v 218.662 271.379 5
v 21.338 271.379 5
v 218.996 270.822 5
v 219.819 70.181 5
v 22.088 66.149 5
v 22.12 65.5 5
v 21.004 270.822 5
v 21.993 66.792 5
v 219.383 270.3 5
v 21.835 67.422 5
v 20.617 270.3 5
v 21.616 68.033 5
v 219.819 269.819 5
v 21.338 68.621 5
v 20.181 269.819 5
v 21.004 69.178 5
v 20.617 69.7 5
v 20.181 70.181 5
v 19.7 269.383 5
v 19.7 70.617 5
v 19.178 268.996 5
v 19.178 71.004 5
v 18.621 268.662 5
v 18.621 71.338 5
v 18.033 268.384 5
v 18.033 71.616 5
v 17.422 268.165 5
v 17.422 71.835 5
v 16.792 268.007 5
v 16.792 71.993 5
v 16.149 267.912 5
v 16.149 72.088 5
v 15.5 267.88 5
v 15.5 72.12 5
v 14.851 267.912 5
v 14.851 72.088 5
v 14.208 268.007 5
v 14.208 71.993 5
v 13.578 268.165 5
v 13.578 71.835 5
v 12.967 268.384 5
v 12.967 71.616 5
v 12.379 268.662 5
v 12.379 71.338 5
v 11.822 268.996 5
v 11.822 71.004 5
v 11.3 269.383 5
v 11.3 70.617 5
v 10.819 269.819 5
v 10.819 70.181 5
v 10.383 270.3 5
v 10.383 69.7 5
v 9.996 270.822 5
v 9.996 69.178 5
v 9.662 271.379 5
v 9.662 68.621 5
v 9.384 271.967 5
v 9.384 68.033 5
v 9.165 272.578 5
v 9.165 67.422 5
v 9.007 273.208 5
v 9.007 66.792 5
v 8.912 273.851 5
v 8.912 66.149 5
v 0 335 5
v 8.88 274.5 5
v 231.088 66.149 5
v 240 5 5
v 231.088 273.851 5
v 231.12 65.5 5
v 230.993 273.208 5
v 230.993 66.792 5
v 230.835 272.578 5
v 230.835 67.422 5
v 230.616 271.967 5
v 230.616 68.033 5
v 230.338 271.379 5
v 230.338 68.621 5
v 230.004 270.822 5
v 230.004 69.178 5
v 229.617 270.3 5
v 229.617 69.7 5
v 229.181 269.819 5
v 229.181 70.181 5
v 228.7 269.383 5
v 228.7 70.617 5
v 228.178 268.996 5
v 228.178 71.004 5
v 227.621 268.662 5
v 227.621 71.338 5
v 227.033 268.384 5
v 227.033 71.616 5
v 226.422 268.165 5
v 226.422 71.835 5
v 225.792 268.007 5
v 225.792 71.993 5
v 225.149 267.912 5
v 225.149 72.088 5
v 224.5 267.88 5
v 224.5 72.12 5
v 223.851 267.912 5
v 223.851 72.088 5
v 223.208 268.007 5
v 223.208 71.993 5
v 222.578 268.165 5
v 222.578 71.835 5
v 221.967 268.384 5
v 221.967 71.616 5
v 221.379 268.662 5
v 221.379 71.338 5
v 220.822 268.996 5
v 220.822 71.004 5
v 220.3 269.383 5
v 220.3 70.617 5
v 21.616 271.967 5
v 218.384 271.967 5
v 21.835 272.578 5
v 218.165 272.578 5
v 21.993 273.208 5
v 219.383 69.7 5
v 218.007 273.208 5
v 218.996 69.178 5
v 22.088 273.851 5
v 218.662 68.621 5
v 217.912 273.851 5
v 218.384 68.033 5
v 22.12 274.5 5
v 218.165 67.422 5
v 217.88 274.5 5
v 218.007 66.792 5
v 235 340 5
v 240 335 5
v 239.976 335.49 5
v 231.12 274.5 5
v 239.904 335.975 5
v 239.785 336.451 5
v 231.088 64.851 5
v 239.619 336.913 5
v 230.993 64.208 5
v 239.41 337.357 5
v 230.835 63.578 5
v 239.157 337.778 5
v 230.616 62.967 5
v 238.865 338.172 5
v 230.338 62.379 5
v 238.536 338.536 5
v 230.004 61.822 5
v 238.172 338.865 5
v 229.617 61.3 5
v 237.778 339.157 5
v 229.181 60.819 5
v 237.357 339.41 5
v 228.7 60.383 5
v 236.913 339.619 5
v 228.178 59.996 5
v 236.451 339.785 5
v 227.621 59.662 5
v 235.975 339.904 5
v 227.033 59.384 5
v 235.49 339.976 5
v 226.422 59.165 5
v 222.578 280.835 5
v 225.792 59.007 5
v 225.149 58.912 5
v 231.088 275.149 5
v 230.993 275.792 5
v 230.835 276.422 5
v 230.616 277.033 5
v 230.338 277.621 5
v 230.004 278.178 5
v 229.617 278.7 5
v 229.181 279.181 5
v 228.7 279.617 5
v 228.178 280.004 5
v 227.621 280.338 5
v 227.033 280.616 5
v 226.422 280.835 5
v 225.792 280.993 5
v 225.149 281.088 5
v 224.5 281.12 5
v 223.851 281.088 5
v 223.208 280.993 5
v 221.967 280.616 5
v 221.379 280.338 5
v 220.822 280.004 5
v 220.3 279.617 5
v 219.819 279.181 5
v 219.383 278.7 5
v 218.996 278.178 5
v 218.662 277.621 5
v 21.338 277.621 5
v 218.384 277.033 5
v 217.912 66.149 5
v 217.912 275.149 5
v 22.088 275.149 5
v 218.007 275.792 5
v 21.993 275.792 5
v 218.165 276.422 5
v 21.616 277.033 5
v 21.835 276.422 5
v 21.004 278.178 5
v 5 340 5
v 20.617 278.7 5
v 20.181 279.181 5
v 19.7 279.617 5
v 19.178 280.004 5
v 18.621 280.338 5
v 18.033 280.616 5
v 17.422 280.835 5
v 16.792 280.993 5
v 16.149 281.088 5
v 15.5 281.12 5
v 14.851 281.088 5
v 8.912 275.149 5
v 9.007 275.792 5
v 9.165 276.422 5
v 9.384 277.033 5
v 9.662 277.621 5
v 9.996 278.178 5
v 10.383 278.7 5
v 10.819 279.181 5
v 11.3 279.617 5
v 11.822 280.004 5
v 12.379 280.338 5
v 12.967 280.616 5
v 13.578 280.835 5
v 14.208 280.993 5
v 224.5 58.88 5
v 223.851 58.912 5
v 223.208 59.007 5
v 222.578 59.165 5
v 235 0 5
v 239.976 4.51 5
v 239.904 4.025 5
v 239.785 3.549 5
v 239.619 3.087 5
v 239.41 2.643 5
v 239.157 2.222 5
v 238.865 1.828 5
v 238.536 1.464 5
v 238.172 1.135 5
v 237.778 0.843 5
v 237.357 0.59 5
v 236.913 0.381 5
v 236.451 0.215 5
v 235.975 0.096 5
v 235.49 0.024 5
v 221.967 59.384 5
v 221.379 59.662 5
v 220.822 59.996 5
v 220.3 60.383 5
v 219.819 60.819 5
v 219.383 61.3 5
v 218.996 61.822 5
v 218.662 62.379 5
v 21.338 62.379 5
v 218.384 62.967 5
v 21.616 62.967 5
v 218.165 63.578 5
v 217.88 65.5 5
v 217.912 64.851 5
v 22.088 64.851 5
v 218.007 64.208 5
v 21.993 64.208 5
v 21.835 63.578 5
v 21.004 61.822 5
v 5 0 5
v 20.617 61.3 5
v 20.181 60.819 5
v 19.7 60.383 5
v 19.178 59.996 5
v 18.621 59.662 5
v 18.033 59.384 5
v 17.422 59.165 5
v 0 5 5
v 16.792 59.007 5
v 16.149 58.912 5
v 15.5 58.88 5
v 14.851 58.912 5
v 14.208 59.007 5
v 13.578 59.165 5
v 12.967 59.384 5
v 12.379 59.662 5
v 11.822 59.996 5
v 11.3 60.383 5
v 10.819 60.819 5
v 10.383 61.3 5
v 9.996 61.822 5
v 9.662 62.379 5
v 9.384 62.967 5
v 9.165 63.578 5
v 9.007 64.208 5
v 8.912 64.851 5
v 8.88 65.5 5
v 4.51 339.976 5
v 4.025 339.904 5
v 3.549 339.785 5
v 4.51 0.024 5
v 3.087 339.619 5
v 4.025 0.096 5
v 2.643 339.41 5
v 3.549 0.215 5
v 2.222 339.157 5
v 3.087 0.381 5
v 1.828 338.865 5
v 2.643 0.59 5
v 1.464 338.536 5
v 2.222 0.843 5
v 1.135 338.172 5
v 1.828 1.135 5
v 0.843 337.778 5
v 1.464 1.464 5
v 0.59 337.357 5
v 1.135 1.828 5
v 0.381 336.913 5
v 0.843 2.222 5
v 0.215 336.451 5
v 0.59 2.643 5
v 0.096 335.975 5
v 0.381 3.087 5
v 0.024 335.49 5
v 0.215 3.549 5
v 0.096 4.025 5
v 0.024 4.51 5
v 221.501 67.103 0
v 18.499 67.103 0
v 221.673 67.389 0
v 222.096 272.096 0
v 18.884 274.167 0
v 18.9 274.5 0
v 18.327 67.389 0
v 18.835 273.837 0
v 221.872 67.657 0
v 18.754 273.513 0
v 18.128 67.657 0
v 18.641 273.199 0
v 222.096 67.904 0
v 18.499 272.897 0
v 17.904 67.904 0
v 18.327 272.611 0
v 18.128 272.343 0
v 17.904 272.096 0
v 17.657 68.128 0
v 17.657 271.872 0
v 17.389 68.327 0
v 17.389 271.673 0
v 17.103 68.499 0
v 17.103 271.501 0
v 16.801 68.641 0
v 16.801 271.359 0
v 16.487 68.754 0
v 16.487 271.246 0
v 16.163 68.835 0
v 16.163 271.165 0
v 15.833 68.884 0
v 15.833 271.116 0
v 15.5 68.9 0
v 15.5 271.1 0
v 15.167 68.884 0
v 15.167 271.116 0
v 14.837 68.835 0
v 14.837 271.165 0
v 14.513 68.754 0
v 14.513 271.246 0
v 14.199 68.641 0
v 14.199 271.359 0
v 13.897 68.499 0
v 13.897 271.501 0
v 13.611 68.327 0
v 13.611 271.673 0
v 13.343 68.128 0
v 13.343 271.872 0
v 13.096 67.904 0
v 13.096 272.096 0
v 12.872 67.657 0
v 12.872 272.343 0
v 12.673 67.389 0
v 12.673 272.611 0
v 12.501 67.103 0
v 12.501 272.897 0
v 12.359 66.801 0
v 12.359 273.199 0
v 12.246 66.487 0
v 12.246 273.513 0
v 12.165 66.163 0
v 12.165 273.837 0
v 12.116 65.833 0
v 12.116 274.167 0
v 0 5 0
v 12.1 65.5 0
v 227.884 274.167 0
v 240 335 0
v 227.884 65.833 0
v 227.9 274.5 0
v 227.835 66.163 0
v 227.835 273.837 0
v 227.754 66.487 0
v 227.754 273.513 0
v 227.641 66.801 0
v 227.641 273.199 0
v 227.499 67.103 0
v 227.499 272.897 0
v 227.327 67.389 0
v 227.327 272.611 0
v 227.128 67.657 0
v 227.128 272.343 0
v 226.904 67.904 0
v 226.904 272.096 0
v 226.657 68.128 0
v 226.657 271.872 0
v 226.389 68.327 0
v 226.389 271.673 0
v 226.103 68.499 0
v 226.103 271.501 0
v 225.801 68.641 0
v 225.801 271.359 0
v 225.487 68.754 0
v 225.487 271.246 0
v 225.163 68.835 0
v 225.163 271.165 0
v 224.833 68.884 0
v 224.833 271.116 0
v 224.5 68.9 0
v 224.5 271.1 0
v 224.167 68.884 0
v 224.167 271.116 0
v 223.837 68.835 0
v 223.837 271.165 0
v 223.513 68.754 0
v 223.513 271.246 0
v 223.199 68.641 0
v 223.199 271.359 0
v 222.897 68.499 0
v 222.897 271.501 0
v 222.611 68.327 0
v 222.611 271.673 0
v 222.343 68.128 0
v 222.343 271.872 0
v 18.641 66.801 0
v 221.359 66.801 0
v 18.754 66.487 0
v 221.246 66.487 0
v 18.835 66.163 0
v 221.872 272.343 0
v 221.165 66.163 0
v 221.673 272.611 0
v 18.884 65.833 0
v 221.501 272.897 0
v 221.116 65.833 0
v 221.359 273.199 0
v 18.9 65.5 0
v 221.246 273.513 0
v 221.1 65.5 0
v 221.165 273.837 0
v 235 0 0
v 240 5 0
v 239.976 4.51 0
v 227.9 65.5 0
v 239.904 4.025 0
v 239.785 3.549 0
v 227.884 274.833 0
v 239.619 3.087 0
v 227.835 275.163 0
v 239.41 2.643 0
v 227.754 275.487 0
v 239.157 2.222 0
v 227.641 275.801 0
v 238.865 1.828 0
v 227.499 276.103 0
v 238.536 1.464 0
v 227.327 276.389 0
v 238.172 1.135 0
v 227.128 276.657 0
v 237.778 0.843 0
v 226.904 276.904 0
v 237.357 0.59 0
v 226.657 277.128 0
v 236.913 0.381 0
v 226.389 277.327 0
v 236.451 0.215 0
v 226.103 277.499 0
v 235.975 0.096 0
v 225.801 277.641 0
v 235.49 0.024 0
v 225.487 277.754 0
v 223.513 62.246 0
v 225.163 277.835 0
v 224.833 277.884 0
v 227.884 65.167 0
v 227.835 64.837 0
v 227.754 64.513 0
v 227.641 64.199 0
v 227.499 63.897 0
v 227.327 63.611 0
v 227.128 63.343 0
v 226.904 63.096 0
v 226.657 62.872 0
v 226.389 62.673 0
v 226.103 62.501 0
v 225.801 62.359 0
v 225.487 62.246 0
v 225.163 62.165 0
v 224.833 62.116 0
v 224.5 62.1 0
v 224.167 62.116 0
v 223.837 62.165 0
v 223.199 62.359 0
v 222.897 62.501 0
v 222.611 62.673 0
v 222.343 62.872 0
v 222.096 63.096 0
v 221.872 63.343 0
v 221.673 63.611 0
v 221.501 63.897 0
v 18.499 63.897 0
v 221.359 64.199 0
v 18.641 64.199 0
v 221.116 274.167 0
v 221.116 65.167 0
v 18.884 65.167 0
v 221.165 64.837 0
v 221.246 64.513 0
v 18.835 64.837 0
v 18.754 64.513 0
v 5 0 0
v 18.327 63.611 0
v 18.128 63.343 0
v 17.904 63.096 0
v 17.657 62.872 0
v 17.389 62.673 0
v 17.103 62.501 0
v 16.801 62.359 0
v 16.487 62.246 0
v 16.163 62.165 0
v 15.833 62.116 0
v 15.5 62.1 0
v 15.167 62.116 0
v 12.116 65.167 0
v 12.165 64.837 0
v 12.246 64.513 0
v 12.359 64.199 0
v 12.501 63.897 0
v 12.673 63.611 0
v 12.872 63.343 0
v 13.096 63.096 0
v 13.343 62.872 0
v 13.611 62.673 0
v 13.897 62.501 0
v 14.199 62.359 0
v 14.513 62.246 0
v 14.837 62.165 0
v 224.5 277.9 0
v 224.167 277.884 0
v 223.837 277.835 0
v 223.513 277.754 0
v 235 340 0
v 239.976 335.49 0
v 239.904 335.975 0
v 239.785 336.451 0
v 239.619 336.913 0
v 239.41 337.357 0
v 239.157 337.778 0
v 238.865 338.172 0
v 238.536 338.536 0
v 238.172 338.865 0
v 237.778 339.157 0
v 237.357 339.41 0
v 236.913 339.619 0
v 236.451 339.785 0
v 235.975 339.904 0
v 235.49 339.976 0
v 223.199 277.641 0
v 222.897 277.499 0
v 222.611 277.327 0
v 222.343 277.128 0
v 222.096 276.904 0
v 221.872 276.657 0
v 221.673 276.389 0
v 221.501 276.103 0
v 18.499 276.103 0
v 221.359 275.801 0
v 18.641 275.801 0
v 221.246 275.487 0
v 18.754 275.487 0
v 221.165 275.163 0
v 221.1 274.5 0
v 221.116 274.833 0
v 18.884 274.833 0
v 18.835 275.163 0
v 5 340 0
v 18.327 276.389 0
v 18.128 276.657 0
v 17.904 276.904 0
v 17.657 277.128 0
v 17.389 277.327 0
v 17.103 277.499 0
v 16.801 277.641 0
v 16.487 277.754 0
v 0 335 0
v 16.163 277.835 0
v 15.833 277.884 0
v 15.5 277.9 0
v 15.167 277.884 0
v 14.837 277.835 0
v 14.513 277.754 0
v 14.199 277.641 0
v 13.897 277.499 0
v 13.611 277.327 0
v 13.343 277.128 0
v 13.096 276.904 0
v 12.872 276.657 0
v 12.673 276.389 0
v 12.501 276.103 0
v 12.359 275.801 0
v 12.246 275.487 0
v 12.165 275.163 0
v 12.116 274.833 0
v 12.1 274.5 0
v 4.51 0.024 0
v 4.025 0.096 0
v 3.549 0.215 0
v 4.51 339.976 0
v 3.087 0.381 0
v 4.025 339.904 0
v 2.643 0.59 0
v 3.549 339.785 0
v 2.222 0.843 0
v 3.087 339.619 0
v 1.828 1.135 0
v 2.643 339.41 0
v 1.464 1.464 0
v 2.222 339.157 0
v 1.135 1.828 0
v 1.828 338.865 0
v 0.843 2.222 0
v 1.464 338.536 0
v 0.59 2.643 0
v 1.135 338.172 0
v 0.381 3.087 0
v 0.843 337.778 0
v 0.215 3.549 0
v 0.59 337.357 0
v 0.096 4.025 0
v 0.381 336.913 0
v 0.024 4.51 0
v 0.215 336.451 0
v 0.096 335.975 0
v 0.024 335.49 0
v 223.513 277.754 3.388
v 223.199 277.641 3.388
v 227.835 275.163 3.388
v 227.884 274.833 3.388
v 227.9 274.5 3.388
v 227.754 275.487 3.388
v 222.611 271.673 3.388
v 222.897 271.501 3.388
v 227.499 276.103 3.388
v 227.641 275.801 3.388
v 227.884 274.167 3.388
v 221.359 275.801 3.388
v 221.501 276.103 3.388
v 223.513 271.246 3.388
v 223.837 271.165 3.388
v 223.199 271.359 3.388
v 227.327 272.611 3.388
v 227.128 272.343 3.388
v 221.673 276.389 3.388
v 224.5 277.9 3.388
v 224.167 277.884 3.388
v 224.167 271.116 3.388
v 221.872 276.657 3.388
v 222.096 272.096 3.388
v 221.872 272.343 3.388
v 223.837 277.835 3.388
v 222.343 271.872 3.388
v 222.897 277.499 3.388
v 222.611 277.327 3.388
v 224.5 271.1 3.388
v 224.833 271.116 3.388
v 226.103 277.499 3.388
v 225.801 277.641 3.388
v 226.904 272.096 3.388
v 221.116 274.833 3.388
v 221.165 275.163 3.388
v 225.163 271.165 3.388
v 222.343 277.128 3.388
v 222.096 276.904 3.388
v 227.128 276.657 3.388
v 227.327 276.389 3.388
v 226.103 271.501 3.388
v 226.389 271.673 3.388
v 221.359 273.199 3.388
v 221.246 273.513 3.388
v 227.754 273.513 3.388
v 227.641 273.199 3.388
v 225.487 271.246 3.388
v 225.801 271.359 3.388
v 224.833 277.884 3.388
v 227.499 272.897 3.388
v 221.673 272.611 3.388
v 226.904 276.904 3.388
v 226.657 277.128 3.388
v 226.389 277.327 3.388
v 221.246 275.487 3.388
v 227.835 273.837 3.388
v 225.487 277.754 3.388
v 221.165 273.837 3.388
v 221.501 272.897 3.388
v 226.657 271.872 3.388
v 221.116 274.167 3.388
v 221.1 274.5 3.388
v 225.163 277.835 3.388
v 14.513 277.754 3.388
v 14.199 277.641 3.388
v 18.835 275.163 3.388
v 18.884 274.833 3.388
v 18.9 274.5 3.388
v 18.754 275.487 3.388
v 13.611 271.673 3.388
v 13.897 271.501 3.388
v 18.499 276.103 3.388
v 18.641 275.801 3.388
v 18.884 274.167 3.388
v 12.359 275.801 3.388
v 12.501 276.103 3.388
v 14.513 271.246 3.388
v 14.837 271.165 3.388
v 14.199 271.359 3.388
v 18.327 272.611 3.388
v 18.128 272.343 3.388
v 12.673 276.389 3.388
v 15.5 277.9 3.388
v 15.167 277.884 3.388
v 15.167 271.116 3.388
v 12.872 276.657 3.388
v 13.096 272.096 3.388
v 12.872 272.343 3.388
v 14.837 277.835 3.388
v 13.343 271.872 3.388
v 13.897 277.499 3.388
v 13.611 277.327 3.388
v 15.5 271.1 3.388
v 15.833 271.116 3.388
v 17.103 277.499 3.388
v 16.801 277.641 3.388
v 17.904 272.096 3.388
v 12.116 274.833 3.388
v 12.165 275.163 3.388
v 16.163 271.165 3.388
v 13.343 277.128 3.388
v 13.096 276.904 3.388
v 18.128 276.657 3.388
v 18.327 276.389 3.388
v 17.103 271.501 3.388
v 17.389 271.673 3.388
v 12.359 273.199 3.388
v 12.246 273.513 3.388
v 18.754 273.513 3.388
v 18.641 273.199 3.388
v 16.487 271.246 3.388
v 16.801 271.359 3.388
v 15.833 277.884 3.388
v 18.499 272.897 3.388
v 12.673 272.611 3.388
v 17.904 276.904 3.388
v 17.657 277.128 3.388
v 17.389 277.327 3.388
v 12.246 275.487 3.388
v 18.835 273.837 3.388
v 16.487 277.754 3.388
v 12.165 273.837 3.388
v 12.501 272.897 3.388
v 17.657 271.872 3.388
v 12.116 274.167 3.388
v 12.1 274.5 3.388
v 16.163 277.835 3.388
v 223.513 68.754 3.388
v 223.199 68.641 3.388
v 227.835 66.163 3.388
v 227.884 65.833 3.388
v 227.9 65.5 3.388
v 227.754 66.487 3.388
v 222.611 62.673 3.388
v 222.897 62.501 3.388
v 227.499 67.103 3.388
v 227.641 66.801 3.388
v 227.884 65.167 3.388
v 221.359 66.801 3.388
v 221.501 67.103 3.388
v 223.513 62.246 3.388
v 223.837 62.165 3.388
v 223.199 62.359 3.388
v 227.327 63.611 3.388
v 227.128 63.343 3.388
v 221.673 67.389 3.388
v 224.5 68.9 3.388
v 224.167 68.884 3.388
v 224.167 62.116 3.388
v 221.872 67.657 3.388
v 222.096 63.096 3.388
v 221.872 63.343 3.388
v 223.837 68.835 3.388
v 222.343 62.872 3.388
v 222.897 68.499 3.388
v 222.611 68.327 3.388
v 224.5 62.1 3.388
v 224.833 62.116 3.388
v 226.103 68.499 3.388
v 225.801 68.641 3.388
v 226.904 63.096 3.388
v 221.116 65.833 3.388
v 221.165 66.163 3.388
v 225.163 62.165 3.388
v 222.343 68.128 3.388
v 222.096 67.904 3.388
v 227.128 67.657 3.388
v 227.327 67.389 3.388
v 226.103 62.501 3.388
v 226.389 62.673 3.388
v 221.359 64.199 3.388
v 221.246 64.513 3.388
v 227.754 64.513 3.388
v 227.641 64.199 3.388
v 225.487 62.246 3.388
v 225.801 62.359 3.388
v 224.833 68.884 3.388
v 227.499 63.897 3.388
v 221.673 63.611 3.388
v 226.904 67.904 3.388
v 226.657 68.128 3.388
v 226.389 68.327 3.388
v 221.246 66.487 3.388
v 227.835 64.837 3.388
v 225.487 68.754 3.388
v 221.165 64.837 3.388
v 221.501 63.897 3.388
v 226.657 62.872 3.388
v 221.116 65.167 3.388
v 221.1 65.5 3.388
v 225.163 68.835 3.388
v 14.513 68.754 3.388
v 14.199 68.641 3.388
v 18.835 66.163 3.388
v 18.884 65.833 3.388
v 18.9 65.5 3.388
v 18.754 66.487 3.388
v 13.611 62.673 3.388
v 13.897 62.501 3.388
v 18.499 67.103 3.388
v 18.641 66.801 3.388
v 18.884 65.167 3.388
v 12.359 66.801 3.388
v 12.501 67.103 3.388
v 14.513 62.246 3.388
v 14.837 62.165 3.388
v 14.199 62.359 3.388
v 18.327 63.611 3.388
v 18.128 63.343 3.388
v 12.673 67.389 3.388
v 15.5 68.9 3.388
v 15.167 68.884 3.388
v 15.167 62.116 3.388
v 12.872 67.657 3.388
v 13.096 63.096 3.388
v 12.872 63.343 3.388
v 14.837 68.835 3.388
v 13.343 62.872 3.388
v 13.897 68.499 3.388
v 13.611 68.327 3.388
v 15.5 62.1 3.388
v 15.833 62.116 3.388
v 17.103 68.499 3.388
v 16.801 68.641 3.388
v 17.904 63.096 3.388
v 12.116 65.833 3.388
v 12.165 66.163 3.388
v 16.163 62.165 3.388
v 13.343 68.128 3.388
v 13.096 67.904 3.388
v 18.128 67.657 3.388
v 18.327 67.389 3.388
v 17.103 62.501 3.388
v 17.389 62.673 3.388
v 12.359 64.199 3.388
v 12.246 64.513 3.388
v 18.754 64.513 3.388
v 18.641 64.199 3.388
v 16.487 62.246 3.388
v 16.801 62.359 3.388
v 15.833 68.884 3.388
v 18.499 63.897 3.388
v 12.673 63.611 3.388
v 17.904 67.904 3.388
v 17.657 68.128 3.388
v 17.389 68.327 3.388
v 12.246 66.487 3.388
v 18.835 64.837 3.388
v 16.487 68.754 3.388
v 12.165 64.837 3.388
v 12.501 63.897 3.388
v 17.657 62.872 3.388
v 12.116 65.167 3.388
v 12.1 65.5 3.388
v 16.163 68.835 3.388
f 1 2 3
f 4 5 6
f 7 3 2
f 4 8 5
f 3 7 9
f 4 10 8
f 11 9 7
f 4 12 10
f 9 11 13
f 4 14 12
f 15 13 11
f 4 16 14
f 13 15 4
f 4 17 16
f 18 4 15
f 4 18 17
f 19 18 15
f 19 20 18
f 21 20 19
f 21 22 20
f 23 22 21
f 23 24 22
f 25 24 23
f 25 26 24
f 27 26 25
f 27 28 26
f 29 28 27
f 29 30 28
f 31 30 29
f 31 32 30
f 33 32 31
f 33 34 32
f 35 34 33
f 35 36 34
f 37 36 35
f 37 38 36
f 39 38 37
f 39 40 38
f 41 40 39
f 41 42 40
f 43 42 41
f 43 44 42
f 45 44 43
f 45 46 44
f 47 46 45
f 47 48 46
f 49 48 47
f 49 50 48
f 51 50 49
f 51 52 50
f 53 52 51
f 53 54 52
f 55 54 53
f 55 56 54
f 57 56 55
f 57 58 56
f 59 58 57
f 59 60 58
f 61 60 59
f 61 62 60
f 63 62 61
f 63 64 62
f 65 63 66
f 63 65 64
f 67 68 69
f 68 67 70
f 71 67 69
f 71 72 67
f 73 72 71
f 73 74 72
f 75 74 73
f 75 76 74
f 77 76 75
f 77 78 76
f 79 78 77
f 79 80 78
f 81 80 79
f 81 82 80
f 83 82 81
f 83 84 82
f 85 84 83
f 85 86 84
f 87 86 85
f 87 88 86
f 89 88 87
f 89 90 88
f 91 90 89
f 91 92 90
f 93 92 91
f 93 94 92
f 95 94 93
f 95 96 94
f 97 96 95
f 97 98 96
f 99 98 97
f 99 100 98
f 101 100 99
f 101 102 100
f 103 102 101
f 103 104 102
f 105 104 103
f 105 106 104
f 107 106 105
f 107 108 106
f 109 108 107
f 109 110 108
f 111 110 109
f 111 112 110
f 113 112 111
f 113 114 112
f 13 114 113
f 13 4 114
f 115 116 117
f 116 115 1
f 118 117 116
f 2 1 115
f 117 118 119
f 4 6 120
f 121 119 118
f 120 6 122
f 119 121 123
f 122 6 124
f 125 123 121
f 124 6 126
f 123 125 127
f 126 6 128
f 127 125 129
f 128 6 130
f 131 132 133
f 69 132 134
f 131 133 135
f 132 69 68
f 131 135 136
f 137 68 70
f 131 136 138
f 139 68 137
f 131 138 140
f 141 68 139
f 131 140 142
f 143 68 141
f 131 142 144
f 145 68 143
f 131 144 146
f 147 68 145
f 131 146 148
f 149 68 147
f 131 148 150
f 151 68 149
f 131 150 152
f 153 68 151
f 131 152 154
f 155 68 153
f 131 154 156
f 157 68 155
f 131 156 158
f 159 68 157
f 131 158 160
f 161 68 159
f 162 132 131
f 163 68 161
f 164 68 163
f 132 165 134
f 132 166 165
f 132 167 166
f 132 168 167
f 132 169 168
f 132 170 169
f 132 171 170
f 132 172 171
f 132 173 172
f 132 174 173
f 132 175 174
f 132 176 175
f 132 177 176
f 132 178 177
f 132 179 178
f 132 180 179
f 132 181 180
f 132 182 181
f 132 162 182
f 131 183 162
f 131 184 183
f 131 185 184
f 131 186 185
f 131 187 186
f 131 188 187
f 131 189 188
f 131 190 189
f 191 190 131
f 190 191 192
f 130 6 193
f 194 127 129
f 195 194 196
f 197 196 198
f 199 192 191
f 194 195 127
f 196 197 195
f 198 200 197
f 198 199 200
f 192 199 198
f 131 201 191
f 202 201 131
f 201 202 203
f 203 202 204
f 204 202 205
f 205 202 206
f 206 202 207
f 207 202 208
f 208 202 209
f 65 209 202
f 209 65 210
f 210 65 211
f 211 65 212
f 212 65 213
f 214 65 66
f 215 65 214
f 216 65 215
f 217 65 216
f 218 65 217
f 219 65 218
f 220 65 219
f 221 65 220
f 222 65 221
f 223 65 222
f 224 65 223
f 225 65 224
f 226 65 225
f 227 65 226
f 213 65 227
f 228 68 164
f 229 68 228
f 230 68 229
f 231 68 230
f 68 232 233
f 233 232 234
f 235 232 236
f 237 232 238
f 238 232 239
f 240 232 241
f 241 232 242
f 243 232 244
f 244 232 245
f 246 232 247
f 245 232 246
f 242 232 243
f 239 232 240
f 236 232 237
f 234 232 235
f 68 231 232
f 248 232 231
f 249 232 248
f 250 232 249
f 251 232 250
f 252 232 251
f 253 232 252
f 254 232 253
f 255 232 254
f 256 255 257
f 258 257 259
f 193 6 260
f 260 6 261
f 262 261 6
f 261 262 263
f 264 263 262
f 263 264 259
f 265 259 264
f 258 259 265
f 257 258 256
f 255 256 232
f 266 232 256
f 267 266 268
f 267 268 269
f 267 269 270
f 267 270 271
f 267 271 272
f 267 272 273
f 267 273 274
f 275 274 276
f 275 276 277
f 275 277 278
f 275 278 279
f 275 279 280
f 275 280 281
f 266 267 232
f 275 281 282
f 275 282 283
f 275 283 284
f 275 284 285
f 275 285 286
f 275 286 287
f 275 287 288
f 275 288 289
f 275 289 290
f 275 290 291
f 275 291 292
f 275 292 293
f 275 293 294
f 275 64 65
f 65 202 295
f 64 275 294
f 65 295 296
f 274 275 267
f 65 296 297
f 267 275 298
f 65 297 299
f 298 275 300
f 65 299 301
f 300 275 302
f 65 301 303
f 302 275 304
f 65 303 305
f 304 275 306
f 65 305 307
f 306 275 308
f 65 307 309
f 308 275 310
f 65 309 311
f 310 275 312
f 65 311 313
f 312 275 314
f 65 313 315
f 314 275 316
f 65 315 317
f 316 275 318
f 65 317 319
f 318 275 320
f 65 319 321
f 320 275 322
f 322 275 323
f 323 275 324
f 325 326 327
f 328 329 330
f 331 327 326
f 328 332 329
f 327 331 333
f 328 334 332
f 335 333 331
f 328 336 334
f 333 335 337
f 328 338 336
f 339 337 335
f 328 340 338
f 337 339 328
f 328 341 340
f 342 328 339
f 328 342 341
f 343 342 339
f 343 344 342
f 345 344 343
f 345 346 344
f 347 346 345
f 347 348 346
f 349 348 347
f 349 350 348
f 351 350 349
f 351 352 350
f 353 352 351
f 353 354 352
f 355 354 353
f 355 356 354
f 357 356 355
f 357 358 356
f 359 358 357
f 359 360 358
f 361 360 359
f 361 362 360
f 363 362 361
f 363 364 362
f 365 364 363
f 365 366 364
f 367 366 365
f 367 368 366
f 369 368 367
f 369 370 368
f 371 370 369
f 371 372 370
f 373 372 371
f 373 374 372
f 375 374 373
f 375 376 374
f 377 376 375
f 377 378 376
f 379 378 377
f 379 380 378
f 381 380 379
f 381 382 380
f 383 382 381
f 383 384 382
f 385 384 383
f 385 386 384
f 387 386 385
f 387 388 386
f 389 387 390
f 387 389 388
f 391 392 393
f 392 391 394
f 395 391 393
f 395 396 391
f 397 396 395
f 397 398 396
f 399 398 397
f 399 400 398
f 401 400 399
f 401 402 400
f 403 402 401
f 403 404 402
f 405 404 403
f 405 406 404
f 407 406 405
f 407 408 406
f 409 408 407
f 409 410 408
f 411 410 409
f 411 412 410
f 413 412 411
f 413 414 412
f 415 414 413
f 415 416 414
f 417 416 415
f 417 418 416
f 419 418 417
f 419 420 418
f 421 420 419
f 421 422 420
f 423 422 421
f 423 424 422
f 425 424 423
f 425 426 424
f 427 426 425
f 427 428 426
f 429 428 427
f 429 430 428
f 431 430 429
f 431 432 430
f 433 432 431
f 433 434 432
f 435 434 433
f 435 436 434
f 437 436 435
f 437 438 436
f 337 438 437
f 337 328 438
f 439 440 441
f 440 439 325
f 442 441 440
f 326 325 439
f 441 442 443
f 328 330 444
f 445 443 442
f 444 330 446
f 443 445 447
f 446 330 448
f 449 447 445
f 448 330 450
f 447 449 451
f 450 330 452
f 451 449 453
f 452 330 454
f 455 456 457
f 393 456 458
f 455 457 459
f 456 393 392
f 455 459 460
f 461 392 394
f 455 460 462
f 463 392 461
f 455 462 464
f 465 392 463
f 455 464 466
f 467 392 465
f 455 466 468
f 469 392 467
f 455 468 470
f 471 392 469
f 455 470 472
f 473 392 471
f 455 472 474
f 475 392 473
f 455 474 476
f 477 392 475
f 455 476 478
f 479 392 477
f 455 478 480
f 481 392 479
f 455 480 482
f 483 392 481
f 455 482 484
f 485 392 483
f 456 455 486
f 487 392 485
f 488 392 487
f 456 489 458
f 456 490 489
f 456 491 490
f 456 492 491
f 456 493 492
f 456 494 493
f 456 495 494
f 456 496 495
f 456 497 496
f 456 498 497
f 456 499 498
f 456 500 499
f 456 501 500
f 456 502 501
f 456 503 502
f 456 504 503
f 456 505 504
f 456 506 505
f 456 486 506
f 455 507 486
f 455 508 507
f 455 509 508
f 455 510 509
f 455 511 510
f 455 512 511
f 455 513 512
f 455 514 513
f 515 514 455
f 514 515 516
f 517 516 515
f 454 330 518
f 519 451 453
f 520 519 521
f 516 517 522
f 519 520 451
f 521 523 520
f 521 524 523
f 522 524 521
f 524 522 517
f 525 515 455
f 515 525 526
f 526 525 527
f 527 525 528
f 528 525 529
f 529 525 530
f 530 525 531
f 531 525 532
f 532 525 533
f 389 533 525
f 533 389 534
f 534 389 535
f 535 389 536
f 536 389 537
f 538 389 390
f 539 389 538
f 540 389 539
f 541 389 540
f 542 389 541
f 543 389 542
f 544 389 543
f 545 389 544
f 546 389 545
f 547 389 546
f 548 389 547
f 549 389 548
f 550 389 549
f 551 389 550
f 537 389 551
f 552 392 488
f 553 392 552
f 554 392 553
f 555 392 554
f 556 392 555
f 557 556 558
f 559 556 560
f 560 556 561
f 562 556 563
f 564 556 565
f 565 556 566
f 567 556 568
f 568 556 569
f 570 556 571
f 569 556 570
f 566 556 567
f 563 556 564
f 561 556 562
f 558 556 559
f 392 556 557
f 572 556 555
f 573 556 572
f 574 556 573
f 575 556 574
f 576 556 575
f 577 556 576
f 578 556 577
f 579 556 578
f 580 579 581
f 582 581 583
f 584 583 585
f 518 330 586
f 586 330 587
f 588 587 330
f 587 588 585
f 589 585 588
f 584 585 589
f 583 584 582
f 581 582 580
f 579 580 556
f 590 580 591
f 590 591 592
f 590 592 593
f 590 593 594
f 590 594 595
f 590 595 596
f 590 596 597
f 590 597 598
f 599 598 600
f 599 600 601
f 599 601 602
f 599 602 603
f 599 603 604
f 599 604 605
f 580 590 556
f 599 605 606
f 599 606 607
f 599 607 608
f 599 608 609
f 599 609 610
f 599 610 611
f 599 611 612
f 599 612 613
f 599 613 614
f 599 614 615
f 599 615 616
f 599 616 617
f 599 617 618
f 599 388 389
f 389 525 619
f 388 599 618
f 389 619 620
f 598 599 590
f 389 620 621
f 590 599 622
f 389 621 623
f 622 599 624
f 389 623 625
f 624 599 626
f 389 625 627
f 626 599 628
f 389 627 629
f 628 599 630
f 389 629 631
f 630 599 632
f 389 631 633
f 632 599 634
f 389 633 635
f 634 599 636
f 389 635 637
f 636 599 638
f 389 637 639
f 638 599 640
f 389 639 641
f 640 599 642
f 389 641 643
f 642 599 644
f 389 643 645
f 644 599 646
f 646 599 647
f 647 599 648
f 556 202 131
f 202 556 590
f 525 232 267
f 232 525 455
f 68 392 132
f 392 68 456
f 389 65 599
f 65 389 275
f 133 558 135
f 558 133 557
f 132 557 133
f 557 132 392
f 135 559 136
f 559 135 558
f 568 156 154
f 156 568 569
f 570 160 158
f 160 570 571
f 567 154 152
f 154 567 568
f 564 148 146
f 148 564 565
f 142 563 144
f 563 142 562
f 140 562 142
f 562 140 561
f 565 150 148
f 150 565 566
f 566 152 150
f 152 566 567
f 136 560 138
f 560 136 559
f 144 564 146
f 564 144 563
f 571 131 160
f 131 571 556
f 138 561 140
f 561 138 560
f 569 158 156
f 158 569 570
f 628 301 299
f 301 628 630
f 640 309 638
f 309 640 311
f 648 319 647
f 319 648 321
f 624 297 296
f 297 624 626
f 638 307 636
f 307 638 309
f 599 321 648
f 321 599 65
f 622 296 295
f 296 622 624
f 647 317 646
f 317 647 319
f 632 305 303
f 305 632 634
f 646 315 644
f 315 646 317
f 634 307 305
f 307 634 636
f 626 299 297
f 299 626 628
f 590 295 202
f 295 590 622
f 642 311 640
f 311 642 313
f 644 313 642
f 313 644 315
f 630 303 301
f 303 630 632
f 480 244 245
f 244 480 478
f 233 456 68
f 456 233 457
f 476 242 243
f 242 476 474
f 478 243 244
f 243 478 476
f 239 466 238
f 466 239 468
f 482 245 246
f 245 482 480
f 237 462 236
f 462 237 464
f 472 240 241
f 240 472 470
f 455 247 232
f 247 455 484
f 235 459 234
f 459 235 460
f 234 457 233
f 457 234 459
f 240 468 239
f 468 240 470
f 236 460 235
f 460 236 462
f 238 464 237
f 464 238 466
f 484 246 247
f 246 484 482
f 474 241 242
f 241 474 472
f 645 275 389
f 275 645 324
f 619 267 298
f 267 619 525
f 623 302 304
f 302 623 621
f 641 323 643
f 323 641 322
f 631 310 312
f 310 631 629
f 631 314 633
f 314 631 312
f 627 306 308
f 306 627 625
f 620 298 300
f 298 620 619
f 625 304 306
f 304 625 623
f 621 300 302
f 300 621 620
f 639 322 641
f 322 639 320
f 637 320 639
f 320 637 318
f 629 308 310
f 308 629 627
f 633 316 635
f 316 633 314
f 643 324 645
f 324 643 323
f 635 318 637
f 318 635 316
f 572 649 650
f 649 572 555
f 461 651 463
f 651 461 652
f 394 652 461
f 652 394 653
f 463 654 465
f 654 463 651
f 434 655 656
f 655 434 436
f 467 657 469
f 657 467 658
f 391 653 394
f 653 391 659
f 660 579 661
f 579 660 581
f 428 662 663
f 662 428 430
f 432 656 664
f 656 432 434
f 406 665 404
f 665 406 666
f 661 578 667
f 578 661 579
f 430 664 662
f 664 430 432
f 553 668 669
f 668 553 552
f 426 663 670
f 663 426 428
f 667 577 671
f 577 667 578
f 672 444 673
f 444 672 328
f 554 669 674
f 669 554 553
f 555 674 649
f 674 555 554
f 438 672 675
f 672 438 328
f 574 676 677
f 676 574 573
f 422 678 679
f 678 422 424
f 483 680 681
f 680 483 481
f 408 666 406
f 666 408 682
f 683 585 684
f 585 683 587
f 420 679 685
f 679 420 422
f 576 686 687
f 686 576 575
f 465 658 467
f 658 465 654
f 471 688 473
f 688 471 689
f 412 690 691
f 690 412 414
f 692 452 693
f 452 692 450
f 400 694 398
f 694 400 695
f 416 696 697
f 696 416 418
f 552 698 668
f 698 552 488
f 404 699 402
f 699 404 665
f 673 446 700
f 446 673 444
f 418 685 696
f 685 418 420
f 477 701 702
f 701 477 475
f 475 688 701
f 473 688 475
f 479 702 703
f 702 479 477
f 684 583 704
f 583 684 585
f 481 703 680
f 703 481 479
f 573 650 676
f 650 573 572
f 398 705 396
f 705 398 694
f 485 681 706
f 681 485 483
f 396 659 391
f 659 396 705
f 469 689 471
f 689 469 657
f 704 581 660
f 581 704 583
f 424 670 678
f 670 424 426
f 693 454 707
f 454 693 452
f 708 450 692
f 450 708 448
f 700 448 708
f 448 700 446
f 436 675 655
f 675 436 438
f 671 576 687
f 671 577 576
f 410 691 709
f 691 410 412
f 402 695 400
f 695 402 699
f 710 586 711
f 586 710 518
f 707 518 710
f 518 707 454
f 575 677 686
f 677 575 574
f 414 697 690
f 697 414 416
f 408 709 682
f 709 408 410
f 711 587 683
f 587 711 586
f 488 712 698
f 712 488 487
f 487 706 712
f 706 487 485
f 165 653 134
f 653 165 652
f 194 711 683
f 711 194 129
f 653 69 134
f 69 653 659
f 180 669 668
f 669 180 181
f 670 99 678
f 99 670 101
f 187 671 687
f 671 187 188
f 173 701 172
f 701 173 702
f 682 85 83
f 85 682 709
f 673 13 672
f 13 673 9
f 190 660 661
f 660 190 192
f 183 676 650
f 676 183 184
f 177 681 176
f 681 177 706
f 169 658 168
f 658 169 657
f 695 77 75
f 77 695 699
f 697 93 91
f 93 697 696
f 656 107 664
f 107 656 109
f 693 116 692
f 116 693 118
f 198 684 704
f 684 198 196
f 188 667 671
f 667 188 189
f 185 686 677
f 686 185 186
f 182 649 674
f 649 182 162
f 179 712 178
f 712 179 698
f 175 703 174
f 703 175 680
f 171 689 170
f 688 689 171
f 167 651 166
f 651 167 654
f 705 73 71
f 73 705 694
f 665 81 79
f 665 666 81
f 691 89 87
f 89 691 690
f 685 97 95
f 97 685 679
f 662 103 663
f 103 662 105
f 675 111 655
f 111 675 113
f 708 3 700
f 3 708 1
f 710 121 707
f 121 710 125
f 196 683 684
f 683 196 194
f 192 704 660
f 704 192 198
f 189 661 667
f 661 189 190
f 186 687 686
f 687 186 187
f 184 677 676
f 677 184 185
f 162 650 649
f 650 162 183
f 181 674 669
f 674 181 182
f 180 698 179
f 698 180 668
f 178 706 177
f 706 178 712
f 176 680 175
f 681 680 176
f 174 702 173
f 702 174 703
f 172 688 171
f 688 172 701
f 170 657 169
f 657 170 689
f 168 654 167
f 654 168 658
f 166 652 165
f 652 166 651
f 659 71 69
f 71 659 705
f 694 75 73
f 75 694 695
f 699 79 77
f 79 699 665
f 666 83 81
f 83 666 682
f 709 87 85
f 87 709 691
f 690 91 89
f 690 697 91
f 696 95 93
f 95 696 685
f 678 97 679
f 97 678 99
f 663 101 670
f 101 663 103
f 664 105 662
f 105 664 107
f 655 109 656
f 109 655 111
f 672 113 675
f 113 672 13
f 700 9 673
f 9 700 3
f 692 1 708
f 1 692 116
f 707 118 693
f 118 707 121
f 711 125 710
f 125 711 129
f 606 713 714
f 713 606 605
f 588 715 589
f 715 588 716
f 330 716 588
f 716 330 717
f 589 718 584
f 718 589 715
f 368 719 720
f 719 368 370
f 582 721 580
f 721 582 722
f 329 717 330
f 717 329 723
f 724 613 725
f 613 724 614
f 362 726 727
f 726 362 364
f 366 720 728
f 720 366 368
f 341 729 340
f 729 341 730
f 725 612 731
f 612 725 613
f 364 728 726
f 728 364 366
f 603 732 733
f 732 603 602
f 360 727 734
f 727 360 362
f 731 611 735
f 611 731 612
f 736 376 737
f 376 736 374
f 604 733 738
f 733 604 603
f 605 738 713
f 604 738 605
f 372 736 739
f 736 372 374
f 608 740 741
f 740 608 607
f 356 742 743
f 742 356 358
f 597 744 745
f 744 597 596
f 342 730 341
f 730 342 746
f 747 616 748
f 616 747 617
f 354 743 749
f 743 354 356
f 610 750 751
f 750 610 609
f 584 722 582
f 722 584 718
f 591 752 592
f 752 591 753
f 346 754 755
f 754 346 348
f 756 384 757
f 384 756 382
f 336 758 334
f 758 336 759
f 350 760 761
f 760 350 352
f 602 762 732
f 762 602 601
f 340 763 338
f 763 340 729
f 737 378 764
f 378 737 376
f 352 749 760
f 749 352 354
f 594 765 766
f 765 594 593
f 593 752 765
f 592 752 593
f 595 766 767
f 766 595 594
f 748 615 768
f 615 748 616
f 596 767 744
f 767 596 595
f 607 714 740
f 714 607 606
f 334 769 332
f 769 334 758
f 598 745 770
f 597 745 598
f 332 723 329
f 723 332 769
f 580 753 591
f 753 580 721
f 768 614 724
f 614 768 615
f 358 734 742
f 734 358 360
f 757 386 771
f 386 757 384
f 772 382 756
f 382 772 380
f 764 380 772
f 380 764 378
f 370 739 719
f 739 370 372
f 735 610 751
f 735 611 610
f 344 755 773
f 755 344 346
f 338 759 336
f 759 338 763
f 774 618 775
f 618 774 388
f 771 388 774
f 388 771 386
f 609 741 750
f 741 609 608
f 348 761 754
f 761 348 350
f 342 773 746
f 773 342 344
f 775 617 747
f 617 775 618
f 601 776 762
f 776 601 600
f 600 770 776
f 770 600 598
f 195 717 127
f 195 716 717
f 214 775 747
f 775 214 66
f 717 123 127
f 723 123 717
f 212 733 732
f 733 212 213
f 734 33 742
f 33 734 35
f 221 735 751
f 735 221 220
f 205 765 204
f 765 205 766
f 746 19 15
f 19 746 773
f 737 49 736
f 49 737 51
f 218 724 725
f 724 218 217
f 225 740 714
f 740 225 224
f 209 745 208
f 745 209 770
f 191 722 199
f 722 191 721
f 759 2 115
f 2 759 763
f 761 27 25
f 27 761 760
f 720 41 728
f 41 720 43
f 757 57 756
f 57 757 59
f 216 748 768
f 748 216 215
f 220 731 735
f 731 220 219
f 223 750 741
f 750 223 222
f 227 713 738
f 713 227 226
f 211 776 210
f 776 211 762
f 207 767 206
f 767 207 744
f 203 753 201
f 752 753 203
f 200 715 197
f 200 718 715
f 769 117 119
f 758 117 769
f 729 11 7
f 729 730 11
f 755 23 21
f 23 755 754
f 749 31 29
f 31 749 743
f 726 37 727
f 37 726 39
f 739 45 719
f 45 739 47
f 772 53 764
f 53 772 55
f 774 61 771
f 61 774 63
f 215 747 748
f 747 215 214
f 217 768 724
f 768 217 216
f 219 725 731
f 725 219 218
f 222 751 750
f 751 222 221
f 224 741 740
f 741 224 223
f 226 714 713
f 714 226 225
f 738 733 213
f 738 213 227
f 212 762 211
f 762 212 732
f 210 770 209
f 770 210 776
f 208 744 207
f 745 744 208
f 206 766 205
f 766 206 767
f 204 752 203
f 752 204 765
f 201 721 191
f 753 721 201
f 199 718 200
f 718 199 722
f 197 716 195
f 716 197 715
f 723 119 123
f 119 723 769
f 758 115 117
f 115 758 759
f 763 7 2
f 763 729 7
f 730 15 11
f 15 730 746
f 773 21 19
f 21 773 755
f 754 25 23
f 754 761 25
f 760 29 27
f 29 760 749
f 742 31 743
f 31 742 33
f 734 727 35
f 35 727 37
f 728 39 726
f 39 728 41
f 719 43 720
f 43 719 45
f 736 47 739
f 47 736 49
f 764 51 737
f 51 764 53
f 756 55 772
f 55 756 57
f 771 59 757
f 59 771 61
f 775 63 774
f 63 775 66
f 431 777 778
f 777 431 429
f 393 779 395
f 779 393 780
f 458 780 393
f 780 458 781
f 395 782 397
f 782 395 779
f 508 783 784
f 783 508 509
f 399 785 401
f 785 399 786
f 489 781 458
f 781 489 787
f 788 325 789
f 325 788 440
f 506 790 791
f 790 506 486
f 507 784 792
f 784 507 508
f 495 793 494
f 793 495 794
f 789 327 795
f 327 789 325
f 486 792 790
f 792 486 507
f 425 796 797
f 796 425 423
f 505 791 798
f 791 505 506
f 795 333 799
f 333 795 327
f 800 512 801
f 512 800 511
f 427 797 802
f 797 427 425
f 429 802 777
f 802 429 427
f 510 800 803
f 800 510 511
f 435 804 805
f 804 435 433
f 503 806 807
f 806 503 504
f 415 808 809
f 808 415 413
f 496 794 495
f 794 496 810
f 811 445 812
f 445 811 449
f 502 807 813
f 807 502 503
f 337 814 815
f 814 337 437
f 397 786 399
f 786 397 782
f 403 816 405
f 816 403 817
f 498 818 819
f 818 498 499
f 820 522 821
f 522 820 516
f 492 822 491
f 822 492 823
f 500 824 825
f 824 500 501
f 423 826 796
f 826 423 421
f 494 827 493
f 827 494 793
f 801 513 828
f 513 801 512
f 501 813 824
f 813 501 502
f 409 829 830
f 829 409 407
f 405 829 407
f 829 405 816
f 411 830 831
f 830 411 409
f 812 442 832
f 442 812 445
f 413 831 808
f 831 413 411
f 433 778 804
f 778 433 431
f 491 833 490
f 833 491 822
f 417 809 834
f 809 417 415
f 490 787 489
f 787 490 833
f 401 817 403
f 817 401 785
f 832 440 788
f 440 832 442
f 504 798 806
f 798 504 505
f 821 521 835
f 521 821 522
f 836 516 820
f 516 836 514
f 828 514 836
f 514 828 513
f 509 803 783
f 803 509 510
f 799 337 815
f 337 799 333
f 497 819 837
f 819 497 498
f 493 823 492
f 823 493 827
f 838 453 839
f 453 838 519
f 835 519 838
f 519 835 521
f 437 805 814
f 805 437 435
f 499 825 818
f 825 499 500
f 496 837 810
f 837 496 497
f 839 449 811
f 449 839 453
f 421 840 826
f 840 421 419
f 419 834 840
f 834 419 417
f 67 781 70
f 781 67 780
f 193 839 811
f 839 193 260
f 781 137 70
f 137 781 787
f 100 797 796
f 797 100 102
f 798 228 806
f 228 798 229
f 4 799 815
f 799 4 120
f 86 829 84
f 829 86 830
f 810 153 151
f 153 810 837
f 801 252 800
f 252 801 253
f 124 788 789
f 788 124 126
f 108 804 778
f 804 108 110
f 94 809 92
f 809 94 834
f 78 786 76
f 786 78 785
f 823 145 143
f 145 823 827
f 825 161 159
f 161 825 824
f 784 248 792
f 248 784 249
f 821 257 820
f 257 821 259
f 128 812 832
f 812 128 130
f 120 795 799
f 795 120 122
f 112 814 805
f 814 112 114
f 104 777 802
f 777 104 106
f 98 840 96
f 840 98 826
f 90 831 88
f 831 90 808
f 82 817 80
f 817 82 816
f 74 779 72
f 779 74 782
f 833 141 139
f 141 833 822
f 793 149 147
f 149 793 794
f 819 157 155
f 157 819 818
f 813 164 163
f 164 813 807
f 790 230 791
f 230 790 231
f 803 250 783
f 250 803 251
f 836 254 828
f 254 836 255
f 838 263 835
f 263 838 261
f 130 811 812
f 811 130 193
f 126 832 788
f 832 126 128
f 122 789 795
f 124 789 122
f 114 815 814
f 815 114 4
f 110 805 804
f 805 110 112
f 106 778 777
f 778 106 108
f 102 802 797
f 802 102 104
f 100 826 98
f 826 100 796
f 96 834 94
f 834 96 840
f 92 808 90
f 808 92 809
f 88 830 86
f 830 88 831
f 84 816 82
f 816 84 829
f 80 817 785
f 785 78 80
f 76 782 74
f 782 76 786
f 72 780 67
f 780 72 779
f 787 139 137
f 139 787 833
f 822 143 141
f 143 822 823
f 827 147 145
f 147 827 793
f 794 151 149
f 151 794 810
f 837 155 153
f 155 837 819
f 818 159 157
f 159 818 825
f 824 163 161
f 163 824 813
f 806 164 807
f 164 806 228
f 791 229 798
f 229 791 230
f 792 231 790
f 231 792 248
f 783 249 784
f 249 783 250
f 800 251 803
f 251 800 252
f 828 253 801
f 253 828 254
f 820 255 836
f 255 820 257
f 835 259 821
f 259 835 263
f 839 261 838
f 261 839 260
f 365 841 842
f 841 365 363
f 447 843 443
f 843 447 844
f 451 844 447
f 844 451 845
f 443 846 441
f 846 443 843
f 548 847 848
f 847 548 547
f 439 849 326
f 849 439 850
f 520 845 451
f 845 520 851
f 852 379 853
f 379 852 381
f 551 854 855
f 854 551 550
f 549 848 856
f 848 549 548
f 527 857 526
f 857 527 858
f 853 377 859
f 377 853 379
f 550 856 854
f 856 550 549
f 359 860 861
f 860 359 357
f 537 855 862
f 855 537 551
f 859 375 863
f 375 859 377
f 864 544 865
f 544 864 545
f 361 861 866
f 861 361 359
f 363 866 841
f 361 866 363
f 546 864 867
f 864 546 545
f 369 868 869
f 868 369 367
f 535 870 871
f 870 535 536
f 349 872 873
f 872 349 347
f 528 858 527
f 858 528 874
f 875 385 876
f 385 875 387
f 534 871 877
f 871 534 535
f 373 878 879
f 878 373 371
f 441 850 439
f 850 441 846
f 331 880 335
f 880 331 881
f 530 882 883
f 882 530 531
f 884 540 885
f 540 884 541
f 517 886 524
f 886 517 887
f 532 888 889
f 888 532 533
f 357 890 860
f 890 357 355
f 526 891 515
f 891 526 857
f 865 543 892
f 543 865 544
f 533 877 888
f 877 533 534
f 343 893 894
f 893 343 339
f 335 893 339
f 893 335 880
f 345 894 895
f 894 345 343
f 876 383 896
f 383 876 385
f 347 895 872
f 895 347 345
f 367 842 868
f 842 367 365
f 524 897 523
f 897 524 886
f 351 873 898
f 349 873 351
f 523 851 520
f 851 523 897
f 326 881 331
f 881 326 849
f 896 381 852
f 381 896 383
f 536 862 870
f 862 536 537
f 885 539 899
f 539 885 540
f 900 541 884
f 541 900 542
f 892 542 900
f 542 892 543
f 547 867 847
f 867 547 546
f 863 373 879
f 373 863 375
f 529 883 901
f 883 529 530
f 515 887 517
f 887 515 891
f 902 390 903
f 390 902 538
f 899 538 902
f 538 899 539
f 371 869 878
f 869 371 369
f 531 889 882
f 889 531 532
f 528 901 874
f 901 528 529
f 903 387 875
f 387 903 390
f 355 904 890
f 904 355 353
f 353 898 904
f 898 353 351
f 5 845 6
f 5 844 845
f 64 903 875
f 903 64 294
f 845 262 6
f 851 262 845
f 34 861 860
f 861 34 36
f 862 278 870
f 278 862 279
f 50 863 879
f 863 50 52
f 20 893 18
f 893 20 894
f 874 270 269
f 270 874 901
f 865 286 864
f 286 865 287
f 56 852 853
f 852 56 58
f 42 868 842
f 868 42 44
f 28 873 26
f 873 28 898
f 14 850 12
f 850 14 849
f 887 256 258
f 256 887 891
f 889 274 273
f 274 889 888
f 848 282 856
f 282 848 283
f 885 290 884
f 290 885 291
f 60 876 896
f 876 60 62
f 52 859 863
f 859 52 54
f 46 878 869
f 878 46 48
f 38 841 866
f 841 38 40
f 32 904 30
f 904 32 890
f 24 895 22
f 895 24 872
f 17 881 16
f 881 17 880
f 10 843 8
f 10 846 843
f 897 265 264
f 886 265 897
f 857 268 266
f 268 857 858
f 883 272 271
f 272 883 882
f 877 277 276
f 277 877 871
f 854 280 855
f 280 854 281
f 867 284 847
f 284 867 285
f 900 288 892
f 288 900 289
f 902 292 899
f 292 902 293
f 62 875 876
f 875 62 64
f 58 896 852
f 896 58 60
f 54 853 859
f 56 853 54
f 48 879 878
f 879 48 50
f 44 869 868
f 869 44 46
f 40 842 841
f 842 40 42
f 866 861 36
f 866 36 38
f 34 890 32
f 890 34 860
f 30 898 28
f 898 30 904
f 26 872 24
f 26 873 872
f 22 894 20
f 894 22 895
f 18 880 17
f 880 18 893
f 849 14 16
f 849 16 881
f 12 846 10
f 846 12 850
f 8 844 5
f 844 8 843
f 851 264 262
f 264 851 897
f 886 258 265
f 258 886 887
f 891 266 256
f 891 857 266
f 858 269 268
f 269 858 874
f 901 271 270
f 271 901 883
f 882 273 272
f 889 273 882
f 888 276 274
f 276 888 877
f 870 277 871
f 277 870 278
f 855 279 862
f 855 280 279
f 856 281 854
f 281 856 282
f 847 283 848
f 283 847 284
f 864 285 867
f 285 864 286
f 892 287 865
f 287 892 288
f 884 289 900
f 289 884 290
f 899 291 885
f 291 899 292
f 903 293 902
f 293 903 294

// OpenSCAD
//BuildPlate.scad
//by Alain Martel 3DFabXYZ.com

//cube([width,depth,height], center)
            //      200x200    200x300    300x300
            //240, 219 (209), 219 (209), 327 (320)      
//240:Custom, 219:Standard 200X, 280:Standard 300X, 327:Long 300X                       
BuildPlatform_X = 240; // [214:1:350]
//340:Custom, 219:Standard 200X, 280:Standard 300X, 327:Long 300X
BuildPlatform_Y = 340; // [214:1:350]
//Thickness of platorm. Default 3mm
BuildPlatform_Z = 5;   // [2.5:0.25:10]
ScrewHole = 3.40*1;
ScrewTapperDia = 6.72*1;
ScrewTapperHeight = 3.3631*1;
ScrewTapperOffset = BuildPlatform_Z-(ScrewTapperHeight-.05);
SmBldPlateDisC = 209*1;
LgBldPlateDisC = 309*1;
//Radius of corners
EdgeRadius = 5; // [0:0.1:10]
//Holes for standard build plate. 209mm X 209mm
SmallCarriage = "yes"; // [yes,no]
//Holes for large build plate. 209mm X 309mm
LargeCarriage = "no"; // [yes,no]
//Holes
RightCenter = "no"; // [yes,no]
//Holes
LeftCenter = "no"; // [yes,no]
//Holes
FrontCenter = "no"; // [yes,no]
//Holes
BackCenter = "no"; // [yes,no]
//Smoothness of rounded elements.
$fn = 64;

module screwhole(){
    union(){        // combine 1st and 2nd children
        cylinder(r=ScrewHole,h=BuildPlatform_Z*2, center = true);
        cylinder(r1=0,r2=ScrewTapperDia,h=ScrewTapperHeight, center = false);
    }    
}

module roundededges(){
    translate([(BuildPlatform_X/2),(BuildPlatform_Y/2),(BuildPlatform_Z/2)])
    union(){
        cube([BuildPlatform_X-(EdgeRadius*2),BuildPlatform_Y,BuildPlatform_Z], center = true);
        cube([BuildPlatform_X,BuildPlatform_Y-(EdgeRadius*2),BuildPlatform_Z], center = true);
        translate([((BuildPlatform_X/2)-EdgeRadius),((BuildPlatform_Y/2)-EdgeRadius),0])
            cylinder(r=EdgeRadius,h=BuildPlatform_Z, center = true);
        translate([-((BuildPlatform_X/2)-EdgeRadius),((BuildPlatform_Y/2)-EdgeRadius),0]) 
            cylinder(r=EdgeRadius,h=BuildPlatform_Z, center = true);
        translate([((BuildPlatform_X/2)-EdgeRadius),-((BuildPlatform_Y/2)-EdgeRadius),0]) 
            cylinder(r=EdgeRadius,h=BuildPlatform_Z, center = true);
        translate([-((BuildPlatform_X/2)-EdgeRadius),-((BuildPlatform_Y/2)-EdgeRadius),0]) 
            cylinder(r=EdgeRadius,h=BuildPlatform_Z, center = true);
    }   
}

difference(){
    roundededges();
    union(){            
         translate([BuildPlatform_X/2,BuildPlatform_Y/2,0]){
            //translate([0,0,ScrewTapperOffset])screwhole();     //Center
            if (FrontCenter == "yes"){ //Lower Center
                translate([SmBldPlateDisC/2,0,ScrewTapperOffset]) 
                    screwhole(); 
            }
            if (BackCenter == "yes"){ //Upper Center
                translate([-SmBldPlateDisC/2,0,ScrewTapperOffset]) 
                    screwhole();            
            }
            if (SmallCarriage == "yes"){ 
                translate([SmBldPlateDisC/2,SmBldPlateDisC/2,ScrewTapperOffset]) 
                    screwhole();     //Sm Lower Right
                if (RightCenter == "yes"){ 
                    translate([0,SmBldPlateDisC/2,ScrewTapperOffset]) 
                        screwhole(); //Sm Right Center            
                }
                translate([-SmBldPlateDisC/2,SmBldPlateDisC/2,ScrewTapperOffset]) 
                    screwhole();     //Sm Upper Right
                translate([SmBldPlateDisC/2,-SmBldPlateDisC/2,ScrewTapperOffset]) 
                    screwhole();     //Sm Lower Left
                if (LeftCenter == "yes"){
                translate([0,-SmBldPlateDisC/2,ScrewTapperOffset]) 
                    screwhole();     //Left Center
                }
                translate([-SmBldPlateDisC/2,-SmBldPlateDisC/2,ScrewTapperOffset]) 
                    screwhole();     //Sm Upper Left
            }
            if (LargeCarriage == "yes"){
                translate([SmBldPlateDisC/2,LgBldPlateDisC/2,ScrewTapperOffset]) 
                    screwhole();     //Lg Lower Right
                if (RightCenter == "yes"){
                    translate([0,LgBldPlateDisC/2,ScrewTapperOffset]) 
                        screwhole(); //Lg Right Center
                }
                translate([-SmBldPlateDisC/2,LgBldPlateDisC/2,ScrewTapperOffset]) 
                    screwhole();     //Lg Upper Right
                translate([SmBldPlateDisC/2,-LgBldPlateDisC/2,ScrewTapperOffset]) 
                    screwhole();     //Lg Lower Left
                if (LeftCenter == "yes"){
                    translate([0,-LgBldPlateDisC/2,ScrewTapperOffset]) 
                        screwhole(); //Lg Left Center
                }
                translate([-SmBldPlateDisC/2,-LgBldPlateDisC/2,ScrewTapperOffset]) 
                    screwhole();     //Lg Upper Left
            }
        }
    }
}
